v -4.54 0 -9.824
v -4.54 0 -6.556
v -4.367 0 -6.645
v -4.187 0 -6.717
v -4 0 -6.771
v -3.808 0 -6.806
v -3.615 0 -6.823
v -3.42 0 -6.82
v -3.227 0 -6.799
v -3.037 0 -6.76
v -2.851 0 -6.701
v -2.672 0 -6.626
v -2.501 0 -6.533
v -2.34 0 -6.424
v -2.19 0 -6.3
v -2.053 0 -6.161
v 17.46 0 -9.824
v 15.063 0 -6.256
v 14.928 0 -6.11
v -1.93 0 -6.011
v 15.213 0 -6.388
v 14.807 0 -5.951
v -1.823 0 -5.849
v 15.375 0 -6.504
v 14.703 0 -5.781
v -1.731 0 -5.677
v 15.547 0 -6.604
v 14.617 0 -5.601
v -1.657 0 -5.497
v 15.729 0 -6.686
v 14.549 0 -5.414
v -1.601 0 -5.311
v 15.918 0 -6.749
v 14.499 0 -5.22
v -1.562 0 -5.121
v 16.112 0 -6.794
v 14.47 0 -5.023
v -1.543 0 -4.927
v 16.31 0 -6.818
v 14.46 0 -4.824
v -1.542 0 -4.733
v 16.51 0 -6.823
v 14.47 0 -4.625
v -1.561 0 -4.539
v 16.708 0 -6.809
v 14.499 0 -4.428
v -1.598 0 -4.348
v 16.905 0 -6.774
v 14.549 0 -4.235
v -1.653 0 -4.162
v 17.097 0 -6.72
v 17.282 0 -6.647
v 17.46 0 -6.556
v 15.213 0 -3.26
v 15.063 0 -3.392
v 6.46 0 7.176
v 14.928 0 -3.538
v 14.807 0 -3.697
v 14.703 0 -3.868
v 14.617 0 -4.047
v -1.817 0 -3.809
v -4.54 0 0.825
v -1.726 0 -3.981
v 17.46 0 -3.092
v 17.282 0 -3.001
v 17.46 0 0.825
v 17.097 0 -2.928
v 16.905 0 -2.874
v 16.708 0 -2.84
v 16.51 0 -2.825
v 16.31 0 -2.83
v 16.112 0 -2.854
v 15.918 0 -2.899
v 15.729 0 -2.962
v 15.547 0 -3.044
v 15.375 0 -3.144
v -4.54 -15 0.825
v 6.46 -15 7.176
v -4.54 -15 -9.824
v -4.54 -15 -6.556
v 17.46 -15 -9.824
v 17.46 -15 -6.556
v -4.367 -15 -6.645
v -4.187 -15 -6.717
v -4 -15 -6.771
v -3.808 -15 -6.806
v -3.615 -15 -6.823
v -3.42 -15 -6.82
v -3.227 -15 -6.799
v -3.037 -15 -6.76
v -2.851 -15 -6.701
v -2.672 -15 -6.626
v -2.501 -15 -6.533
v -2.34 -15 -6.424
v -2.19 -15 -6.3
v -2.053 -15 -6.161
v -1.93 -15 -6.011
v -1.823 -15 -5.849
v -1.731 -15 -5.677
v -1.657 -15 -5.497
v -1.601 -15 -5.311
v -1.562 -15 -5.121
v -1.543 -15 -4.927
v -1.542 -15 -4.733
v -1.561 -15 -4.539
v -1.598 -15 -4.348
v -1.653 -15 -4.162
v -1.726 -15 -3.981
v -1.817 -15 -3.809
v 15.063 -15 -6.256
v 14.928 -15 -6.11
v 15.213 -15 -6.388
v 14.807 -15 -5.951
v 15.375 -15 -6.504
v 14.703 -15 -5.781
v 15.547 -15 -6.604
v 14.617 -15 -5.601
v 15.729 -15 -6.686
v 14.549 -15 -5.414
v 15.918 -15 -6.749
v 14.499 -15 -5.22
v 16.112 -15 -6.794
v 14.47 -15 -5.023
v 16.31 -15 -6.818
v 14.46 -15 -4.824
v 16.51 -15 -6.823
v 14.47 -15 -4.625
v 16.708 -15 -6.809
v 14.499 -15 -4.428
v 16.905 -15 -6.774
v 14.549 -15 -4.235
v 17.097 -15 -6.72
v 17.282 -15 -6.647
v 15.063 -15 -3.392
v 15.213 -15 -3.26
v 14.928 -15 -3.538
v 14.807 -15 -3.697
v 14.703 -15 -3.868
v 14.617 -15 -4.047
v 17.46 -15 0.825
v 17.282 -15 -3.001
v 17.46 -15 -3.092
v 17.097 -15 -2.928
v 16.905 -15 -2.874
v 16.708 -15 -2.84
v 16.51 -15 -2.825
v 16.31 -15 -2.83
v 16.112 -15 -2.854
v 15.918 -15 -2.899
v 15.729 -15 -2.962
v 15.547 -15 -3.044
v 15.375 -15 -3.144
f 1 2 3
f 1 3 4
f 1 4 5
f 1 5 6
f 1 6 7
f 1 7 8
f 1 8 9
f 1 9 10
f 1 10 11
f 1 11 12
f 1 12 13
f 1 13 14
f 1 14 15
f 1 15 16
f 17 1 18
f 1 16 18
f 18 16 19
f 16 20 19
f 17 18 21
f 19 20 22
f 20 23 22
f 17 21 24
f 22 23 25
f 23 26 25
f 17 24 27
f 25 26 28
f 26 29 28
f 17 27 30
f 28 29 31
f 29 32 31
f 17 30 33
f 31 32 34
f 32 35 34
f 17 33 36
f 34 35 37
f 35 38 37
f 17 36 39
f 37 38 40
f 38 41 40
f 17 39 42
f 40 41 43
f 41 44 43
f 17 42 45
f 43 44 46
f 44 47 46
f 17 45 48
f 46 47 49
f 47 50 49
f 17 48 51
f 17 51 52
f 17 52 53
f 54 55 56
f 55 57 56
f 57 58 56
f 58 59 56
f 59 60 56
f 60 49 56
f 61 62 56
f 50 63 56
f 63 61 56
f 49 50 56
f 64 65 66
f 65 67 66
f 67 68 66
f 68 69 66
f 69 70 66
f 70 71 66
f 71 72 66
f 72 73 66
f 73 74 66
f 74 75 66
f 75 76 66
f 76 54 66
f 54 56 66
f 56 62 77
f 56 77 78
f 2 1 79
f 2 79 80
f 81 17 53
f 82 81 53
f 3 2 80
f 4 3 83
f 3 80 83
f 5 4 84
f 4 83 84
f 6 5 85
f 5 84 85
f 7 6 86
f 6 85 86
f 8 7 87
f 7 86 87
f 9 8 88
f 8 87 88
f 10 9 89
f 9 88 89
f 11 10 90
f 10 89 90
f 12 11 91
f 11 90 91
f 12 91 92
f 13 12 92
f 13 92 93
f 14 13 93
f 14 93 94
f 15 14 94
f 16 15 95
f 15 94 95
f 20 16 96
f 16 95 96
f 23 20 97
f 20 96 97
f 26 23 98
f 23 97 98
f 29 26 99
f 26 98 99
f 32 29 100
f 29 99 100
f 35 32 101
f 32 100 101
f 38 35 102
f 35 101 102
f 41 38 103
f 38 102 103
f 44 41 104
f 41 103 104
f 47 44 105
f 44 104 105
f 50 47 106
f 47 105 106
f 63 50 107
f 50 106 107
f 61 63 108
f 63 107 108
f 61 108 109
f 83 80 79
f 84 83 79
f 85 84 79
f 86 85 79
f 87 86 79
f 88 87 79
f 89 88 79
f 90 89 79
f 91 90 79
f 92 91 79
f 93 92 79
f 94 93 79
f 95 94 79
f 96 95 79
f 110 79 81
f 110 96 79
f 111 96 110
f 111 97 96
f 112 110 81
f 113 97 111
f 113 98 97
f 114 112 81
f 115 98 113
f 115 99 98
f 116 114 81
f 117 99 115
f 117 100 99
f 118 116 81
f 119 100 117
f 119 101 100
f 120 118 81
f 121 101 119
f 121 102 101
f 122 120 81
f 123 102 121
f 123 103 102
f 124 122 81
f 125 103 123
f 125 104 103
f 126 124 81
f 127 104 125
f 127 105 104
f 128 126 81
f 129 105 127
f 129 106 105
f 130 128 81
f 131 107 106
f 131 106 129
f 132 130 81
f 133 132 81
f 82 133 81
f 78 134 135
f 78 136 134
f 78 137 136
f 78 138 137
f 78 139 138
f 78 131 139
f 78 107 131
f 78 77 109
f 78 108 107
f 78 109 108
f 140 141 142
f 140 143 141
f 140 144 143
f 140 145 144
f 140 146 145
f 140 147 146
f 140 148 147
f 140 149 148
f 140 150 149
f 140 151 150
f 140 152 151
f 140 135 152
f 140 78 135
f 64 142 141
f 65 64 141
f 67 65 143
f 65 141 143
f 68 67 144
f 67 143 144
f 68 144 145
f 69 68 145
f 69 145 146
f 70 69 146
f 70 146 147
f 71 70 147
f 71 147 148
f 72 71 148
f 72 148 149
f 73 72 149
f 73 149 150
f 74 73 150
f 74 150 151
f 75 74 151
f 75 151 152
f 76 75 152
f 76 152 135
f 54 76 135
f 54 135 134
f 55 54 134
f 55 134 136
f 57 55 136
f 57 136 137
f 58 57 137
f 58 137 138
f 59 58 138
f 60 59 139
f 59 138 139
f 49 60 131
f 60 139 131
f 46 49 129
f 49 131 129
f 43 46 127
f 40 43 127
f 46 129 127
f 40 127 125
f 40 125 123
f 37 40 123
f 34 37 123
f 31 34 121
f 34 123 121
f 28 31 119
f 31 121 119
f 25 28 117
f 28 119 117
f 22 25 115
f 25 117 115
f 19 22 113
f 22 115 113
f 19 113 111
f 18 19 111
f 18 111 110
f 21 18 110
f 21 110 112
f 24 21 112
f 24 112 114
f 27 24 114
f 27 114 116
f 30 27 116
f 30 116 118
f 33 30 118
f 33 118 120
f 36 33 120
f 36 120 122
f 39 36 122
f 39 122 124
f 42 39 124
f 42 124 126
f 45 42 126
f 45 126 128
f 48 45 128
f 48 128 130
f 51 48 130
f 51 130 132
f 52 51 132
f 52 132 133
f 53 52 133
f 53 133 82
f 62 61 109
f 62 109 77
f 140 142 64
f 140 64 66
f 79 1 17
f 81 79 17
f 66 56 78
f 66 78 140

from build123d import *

# Parameters (mm, degrees)
F0_W     = 22
F0_H     = 17
F1_DEPTH = 15
F2_R     = 2
F3_DEPTH = 33.7
F5_DEPTH = 25
F7_DEPTH = 25


with BuildPart() as f1:
    # F0 (on Front) → F1 (new body)
    with BuildSketch(Plane.XZ):
        with Locations((6.459691, -1.324071)):
            Rectangle(F0_W, F0_H)
    extrude(amount=F1_DEPTH)

    # F2 (on face) → F3 (cut)
    with BuildSketch(Plane.XZ.offset(15)):
        with Locations((16.459691, -4.824071)):
            Circle(F2_R)
        with Locations((-3.540309, -4.824071)):
            Circle(F2_R)
    extrude(amount=-F3_DEPTH, mode=Mode.SUBTRACT)

    # F4 (on face) → F5 (cut)
    with BuildSketch(Plane.XZ.offset(15)):
        Polygon((-4.540309, 0.825076), (6.459691, 7.175929), (-4.540309, 7.175929), align=None)
        Polygon((17.459691, 7.175929), (6.459691, 7.175929), (17.459691, 0.825076), align=None)
    extrude(amount=-F5_DEPTH, mode=Mode.SUBTRACT)

    # F6 (on face) → F7 (cut)
    with BuildSketch(Plane.XZ.offset(15)):
        with BuildLine():
            Line((-1.816008, -3.810768), (-4.540309, 0.825076))
            Line((-4.540309, 0.825076), (-4.540309, -3.092021))
            ThreePointArc((-4.540309, -3.092021), (-3.030111, -2.890242), (-1.816008, -3.810768))
        make_face()
    extrude(amount=-F7_DEPTH, mode=Mode.SUBTRACT)


solid = f1.part
